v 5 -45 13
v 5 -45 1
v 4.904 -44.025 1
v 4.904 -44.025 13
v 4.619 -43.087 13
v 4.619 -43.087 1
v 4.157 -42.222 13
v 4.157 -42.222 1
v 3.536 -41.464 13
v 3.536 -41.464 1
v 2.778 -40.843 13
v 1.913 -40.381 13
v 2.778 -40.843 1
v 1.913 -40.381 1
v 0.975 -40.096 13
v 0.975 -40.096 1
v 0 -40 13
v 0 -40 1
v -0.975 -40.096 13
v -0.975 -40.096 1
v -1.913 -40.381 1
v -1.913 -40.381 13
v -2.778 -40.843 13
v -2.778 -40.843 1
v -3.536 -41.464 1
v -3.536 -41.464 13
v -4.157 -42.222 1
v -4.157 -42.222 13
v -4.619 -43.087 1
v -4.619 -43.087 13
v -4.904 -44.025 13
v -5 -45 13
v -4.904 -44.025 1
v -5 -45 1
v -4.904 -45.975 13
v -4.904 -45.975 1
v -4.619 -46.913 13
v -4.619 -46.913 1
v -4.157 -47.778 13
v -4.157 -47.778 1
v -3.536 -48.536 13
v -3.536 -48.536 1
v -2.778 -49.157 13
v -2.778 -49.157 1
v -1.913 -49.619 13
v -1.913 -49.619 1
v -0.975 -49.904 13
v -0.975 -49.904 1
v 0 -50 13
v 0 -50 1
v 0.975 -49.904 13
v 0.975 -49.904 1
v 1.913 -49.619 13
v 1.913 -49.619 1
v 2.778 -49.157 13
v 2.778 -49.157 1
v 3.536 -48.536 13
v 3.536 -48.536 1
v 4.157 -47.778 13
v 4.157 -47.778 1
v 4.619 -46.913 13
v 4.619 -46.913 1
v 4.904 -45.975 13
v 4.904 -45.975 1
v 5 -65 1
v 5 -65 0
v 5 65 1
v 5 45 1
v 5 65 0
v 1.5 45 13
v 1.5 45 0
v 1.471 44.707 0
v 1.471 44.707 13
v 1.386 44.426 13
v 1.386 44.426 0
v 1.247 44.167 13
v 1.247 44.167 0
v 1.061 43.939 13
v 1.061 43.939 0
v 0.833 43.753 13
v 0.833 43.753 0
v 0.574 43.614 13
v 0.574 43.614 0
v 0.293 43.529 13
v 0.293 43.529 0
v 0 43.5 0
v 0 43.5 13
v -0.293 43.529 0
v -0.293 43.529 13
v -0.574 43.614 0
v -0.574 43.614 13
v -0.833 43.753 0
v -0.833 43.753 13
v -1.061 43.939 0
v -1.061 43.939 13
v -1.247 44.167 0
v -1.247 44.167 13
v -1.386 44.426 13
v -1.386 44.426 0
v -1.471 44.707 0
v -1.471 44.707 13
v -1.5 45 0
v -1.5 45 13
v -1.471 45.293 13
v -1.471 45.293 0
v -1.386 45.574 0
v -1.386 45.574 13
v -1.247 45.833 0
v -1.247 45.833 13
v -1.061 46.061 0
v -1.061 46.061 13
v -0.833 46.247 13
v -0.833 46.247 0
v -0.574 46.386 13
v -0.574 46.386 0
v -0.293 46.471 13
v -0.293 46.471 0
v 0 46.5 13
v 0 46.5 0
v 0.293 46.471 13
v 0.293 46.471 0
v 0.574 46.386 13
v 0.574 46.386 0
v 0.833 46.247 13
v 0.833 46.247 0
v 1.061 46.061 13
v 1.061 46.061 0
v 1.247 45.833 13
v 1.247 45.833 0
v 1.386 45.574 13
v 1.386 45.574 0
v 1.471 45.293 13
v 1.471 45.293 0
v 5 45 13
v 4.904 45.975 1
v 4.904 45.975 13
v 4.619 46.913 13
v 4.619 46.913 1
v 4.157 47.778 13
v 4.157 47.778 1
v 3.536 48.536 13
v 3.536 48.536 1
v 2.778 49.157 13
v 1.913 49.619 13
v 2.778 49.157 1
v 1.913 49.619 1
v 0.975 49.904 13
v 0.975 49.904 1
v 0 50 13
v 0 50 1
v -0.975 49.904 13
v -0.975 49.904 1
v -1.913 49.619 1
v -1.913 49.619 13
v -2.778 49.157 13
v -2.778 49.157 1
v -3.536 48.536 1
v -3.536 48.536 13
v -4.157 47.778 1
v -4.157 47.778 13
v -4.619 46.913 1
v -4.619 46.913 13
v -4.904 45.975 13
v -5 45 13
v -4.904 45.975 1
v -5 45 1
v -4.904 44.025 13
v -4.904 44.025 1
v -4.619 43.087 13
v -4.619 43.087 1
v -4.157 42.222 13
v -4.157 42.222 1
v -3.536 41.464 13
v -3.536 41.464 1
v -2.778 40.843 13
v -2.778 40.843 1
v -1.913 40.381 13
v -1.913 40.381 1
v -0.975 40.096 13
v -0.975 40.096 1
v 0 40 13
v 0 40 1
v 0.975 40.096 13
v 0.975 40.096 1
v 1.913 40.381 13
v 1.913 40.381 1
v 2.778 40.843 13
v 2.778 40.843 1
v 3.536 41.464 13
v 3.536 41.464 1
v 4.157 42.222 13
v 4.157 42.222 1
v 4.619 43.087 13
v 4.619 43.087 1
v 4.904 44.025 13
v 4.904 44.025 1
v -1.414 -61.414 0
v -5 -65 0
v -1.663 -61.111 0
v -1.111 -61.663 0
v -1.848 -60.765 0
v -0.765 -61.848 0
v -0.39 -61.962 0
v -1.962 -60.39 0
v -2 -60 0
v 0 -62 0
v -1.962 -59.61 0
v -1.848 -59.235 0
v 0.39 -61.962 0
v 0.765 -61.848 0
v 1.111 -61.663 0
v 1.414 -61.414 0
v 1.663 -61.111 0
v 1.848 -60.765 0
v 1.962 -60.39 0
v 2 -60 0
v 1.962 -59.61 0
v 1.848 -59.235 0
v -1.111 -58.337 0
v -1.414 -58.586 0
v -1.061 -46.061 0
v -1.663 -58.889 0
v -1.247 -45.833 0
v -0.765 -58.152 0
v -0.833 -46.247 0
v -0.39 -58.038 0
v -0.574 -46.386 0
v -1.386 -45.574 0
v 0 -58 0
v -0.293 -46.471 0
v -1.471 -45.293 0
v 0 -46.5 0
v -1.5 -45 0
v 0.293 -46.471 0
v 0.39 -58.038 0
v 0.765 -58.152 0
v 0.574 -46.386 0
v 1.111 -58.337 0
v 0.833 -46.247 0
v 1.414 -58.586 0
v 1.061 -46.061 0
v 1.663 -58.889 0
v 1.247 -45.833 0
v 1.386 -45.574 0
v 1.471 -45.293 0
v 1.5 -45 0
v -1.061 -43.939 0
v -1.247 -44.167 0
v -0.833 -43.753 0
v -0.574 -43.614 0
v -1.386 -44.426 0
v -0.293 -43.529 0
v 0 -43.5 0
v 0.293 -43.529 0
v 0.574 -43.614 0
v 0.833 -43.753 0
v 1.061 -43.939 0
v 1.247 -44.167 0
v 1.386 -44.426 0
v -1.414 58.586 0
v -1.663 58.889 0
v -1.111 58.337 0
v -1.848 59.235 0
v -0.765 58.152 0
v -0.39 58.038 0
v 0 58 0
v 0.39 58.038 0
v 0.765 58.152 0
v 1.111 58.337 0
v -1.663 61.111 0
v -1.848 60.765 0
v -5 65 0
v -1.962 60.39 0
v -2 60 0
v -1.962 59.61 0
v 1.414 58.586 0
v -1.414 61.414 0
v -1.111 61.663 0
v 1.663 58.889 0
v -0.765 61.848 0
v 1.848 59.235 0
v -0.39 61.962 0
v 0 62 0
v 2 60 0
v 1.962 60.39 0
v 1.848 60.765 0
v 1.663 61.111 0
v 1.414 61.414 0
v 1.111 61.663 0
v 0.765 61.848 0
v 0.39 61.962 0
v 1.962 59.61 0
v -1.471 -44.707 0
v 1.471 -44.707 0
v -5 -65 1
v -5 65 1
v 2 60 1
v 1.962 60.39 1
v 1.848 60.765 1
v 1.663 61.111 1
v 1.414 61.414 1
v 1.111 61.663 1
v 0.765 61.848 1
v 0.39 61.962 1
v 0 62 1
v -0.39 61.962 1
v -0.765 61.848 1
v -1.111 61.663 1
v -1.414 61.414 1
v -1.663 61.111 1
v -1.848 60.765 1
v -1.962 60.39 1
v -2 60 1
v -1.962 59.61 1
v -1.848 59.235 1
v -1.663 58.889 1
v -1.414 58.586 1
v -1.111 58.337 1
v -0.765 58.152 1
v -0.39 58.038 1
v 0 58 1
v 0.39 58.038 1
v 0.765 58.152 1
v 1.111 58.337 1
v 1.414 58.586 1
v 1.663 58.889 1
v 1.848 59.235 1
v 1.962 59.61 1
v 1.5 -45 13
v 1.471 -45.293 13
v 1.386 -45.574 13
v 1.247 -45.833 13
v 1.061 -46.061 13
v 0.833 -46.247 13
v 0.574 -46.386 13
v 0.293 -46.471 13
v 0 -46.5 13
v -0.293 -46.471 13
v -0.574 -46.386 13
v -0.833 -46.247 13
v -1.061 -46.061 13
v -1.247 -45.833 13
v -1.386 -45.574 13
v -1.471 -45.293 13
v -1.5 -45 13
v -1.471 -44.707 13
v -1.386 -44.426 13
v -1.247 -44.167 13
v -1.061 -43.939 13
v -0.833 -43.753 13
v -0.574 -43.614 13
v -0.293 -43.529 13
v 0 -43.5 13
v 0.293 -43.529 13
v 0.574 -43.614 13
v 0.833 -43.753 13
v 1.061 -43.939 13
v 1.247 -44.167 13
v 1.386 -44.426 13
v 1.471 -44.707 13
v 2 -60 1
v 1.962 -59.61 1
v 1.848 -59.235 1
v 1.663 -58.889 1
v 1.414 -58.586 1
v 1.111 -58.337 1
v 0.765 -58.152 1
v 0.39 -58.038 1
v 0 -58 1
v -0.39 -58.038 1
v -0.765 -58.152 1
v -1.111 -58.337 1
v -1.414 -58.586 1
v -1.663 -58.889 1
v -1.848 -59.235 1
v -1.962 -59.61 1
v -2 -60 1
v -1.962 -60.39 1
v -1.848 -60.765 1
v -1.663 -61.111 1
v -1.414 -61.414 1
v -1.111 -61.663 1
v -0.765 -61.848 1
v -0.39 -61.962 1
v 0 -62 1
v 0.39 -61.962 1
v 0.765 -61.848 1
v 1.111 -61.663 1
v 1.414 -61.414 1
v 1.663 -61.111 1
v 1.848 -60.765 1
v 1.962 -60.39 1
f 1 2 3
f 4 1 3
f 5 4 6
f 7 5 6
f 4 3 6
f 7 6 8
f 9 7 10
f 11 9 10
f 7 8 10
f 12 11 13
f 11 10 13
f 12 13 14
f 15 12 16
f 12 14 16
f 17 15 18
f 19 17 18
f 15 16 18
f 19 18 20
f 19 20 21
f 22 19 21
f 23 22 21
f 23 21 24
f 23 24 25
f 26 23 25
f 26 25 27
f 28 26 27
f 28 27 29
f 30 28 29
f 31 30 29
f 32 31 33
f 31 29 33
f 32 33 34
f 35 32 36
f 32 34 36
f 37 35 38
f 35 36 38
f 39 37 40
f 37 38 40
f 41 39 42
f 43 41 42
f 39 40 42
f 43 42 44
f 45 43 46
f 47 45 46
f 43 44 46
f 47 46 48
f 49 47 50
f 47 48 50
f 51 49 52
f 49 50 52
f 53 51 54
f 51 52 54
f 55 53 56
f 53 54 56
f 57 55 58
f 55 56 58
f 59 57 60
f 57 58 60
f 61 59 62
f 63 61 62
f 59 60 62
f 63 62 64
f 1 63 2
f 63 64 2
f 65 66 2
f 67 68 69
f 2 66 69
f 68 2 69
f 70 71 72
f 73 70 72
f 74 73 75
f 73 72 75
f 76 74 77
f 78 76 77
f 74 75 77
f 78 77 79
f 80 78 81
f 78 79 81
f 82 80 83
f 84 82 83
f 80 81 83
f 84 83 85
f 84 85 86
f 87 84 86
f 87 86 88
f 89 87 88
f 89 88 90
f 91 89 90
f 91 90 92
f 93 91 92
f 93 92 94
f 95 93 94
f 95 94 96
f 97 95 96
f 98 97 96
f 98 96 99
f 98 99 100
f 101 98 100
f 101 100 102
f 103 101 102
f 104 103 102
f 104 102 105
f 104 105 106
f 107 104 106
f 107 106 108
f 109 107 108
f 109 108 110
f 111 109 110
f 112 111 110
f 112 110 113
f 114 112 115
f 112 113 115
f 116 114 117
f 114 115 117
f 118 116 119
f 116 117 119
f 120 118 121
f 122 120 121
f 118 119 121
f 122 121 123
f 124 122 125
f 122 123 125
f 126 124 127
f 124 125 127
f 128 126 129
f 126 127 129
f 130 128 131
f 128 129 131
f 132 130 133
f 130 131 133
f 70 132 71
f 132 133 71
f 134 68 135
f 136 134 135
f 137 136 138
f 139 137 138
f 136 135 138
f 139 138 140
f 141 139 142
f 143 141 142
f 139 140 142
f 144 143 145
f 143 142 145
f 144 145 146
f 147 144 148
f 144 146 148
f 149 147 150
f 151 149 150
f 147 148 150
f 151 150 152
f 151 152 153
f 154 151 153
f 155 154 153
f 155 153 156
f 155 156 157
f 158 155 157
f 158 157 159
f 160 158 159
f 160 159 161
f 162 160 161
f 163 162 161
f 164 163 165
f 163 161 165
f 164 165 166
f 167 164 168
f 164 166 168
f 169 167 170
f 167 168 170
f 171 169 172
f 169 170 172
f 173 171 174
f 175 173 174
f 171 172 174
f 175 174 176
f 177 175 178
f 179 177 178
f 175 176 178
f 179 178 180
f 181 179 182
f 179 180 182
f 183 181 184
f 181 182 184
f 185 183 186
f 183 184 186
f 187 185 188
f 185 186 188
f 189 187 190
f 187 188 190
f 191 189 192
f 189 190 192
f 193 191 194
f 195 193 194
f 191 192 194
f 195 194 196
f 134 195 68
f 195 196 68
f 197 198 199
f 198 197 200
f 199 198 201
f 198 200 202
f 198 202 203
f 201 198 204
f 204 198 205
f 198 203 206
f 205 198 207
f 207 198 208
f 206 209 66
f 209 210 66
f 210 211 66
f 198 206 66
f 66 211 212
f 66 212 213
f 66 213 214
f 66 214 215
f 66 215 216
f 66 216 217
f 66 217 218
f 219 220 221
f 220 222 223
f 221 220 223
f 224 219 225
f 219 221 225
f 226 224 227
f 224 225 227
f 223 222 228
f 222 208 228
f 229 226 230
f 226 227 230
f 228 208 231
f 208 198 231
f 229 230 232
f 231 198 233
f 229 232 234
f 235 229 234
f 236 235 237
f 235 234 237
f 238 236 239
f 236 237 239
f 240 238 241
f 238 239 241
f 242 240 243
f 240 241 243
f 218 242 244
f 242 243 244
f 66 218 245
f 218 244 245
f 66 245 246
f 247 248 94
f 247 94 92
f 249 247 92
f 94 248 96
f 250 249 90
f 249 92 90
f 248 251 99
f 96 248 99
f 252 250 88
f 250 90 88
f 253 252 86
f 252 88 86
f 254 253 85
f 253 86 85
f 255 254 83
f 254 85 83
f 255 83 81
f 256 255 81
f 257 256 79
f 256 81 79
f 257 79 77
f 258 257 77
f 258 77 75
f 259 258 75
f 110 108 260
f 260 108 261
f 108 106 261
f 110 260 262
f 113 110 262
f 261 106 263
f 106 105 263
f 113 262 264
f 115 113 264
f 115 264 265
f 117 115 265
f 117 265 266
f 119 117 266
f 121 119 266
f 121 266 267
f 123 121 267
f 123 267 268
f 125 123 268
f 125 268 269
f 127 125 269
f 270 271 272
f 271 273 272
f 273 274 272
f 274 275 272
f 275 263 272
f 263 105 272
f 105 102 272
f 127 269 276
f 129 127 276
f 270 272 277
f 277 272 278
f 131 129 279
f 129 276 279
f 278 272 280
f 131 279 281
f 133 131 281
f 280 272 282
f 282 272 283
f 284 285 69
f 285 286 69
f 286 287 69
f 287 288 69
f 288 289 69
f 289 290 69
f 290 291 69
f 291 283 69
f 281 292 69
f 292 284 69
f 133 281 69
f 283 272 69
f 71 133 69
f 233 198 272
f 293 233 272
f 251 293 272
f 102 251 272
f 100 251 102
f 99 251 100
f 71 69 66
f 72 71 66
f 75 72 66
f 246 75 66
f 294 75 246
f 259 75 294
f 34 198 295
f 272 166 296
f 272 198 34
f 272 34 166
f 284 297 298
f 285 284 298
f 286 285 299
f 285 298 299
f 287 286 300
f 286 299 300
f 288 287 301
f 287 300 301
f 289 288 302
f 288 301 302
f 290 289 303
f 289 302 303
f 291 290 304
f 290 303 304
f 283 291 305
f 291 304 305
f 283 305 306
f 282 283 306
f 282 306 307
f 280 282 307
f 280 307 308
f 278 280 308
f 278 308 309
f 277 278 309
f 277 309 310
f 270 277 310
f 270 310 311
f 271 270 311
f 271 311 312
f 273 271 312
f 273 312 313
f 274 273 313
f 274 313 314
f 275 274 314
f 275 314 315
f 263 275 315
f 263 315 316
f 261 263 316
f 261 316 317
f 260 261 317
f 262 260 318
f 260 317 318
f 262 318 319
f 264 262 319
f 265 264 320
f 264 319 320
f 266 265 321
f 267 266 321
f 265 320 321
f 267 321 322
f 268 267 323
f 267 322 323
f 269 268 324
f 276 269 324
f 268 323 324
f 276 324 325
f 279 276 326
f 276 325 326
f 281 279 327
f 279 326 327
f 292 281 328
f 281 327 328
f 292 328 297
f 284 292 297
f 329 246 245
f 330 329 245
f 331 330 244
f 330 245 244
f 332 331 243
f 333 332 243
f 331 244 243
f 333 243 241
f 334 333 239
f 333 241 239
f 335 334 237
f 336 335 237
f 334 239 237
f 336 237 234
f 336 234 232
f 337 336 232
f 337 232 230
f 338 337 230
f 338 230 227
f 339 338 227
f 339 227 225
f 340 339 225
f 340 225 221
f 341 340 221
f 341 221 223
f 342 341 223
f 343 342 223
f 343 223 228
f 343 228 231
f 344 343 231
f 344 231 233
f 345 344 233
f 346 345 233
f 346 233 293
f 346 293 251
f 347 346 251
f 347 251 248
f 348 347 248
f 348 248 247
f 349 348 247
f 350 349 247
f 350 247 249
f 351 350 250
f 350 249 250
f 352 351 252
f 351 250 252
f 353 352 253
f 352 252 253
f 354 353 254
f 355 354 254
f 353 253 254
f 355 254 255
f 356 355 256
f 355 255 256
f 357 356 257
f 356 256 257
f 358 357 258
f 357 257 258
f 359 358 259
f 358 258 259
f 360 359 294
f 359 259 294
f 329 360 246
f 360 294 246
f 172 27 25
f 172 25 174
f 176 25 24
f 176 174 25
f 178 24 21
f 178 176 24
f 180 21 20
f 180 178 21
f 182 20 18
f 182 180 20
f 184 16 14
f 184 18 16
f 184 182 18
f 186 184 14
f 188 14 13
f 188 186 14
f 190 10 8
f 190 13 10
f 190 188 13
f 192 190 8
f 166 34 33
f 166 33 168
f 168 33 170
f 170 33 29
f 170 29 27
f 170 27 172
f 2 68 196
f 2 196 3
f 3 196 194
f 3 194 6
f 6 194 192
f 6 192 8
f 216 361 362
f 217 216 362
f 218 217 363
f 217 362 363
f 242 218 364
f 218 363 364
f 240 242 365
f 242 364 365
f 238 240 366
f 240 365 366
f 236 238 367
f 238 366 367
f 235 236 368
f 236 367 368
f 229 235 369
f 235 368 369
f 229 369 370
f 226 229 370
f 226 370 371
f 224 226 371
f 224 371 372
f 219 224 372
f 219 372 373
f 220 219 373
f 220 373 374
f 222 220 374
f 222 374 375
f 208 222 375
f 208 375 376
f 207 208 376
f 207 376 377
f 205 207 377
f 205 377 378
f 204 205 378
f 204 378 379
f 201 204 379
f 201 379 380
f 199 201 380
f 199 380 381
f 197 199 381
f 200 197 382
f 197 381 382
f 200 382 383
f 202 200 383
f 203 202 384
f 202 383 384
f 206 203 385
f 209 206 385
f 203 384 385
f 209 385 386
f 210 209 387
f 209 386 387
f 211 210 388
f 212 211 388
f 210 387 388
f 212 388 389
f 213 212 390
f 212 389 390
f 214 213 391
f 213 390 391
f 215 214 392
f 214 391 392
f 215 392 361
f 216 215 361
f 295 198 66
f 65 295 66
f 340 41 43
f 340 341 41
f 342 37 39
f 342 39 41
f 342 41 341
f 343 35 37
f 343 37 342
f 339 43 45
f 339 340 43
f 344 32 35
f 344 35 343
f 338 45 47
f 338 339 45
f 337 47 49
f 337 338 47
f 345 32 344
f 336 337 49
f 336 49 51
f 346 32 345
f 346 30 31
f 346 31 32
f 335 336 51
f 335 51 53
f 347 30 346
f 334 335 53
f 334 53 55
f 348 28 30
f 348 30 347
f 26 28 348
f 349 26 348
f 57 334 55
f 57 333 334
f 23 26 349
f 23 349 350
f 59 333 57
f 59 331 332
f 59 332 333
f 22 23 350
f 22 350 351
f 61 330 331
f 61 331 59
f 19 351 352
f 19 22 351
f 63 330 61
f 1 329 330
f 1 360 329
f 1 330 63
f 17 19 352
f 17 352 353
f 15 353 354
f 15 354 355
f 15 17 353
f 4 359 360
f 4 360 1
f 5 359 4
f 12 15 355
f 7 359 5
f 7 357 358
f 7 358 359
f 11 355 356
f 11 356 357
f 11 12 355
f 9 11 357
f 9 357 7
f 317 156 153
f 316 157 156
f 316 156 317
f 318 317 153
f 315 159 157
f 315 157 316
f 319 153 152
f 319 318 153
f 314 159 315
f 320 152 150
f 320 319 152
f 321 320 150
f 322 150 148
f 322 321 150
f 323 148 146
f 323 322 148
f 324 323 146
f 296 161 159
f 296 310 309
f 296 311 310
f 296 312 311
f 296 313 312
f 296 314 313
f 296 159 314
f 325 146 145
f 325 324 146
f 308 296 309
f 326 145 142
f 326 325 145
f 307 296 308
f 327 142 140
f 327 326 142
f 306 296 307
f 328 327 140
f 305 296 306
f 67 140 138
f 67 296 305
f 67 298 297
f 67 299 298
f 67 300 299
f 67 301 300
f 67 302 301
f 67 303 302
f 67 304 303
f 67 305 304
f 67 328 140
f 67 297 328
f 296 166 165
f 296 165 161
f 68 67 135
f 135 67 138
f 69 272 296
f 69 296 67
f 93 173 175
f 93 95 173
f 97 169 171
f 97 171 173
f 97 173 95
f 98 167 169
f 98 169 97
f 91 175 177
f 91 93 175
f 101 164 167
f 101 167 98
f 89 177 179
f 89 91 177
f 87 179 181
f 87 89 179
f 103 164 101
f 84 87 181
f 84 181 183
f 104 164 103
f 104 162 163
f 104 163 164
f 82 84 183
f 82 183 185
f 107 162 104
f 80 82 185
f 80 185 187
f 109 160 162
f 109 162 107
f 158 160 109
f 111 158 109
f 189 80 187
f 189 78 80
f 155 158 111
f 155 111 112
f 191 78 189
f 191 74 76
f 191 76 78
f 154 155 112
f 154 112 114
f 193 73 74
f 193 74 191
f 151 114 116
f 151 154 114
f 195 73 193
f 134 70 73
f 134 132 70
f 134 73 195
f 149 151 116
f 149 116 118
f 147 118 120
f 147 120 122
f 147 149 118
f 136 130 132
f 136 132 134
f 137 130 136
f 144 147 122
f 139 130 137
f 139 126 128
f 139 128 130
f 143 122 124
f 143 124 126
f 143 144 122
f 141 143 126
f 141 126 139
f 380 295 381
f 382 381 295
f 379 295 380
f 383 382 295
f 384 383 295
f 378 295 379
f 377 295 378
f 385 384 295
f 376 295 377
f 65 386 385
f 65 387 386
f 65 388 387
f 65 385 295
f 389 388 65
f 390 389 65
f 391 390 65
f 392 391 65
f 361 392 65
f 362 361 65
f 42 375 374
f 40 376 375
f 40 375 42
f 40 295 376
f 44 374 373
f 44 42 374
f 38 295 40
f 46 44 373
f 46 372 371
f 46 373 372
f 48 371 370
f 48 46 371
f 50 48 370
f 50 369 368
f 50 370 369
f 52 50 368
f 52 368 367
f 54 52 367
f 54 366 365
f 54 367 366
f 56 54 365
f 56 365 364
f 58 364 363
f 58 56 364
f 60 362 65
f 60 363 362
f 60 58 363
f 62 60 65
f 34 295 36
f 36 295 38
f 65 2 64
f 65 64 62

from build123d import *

# Parameters (mm, degrees)
F0_W     = 10
F0_H     = 130
F1_DEPTH = 1
F2_R     = 2
F3_DEPTH = 25
F5_DEPTH = 12
F6_R     = 1.5
F7_DEPTH = 25


with BuildPart() as f1:
    # F0 (on Top) → F1 (new body)
    with BuildSketch(Plane.XY):
        Rectangle(F0_W, F0_H)
    extrude(amount=F1_DEPTH)

    # F2 (on face) → F3 (cut)
    with BuildSketch(Plane.XY.offset(1)):
        with Locations((0, 60)):
            Circle(F2_R)
        with Locations((0, -60)):
            Circle(F2_R)
    extrude(amount=-F3_DEPTH, mode=Mode.SUBTRACT)

    # F4 (on face) → F5 (join)
    with BuildSketch(Plane.XY.offset(1)):
        with BuildLine():
            ThreePointArc((-5, 45), (0, 40), (5, 45))
            ThreePointArc((5, 45), (0, 50), (-5, 45))
        make_face()
        with BuildLine():
            ThreePointArc((-5, -45), (0, -50), (5, -45))
            ThreePointArc((5, -45), (0, -40), (-5, -45))
        make_face()
    extrude(amount=F5_DEPTH)

    # F6 (on face) → F7 (cut)
    with BuildSketch(Plane(origin=(0, 0, 0), x_dir=(1, 0, 0), z_dir=(0, 0, -1))):
        with Locations((0, -45)):
            Circle(F6_R)
        with Locations((0, 45)):
            Circle(F6_R)
    extrude(amount=-F7_DEPTH, mode=Mode.SUBTRACT)


solid = f1.part
